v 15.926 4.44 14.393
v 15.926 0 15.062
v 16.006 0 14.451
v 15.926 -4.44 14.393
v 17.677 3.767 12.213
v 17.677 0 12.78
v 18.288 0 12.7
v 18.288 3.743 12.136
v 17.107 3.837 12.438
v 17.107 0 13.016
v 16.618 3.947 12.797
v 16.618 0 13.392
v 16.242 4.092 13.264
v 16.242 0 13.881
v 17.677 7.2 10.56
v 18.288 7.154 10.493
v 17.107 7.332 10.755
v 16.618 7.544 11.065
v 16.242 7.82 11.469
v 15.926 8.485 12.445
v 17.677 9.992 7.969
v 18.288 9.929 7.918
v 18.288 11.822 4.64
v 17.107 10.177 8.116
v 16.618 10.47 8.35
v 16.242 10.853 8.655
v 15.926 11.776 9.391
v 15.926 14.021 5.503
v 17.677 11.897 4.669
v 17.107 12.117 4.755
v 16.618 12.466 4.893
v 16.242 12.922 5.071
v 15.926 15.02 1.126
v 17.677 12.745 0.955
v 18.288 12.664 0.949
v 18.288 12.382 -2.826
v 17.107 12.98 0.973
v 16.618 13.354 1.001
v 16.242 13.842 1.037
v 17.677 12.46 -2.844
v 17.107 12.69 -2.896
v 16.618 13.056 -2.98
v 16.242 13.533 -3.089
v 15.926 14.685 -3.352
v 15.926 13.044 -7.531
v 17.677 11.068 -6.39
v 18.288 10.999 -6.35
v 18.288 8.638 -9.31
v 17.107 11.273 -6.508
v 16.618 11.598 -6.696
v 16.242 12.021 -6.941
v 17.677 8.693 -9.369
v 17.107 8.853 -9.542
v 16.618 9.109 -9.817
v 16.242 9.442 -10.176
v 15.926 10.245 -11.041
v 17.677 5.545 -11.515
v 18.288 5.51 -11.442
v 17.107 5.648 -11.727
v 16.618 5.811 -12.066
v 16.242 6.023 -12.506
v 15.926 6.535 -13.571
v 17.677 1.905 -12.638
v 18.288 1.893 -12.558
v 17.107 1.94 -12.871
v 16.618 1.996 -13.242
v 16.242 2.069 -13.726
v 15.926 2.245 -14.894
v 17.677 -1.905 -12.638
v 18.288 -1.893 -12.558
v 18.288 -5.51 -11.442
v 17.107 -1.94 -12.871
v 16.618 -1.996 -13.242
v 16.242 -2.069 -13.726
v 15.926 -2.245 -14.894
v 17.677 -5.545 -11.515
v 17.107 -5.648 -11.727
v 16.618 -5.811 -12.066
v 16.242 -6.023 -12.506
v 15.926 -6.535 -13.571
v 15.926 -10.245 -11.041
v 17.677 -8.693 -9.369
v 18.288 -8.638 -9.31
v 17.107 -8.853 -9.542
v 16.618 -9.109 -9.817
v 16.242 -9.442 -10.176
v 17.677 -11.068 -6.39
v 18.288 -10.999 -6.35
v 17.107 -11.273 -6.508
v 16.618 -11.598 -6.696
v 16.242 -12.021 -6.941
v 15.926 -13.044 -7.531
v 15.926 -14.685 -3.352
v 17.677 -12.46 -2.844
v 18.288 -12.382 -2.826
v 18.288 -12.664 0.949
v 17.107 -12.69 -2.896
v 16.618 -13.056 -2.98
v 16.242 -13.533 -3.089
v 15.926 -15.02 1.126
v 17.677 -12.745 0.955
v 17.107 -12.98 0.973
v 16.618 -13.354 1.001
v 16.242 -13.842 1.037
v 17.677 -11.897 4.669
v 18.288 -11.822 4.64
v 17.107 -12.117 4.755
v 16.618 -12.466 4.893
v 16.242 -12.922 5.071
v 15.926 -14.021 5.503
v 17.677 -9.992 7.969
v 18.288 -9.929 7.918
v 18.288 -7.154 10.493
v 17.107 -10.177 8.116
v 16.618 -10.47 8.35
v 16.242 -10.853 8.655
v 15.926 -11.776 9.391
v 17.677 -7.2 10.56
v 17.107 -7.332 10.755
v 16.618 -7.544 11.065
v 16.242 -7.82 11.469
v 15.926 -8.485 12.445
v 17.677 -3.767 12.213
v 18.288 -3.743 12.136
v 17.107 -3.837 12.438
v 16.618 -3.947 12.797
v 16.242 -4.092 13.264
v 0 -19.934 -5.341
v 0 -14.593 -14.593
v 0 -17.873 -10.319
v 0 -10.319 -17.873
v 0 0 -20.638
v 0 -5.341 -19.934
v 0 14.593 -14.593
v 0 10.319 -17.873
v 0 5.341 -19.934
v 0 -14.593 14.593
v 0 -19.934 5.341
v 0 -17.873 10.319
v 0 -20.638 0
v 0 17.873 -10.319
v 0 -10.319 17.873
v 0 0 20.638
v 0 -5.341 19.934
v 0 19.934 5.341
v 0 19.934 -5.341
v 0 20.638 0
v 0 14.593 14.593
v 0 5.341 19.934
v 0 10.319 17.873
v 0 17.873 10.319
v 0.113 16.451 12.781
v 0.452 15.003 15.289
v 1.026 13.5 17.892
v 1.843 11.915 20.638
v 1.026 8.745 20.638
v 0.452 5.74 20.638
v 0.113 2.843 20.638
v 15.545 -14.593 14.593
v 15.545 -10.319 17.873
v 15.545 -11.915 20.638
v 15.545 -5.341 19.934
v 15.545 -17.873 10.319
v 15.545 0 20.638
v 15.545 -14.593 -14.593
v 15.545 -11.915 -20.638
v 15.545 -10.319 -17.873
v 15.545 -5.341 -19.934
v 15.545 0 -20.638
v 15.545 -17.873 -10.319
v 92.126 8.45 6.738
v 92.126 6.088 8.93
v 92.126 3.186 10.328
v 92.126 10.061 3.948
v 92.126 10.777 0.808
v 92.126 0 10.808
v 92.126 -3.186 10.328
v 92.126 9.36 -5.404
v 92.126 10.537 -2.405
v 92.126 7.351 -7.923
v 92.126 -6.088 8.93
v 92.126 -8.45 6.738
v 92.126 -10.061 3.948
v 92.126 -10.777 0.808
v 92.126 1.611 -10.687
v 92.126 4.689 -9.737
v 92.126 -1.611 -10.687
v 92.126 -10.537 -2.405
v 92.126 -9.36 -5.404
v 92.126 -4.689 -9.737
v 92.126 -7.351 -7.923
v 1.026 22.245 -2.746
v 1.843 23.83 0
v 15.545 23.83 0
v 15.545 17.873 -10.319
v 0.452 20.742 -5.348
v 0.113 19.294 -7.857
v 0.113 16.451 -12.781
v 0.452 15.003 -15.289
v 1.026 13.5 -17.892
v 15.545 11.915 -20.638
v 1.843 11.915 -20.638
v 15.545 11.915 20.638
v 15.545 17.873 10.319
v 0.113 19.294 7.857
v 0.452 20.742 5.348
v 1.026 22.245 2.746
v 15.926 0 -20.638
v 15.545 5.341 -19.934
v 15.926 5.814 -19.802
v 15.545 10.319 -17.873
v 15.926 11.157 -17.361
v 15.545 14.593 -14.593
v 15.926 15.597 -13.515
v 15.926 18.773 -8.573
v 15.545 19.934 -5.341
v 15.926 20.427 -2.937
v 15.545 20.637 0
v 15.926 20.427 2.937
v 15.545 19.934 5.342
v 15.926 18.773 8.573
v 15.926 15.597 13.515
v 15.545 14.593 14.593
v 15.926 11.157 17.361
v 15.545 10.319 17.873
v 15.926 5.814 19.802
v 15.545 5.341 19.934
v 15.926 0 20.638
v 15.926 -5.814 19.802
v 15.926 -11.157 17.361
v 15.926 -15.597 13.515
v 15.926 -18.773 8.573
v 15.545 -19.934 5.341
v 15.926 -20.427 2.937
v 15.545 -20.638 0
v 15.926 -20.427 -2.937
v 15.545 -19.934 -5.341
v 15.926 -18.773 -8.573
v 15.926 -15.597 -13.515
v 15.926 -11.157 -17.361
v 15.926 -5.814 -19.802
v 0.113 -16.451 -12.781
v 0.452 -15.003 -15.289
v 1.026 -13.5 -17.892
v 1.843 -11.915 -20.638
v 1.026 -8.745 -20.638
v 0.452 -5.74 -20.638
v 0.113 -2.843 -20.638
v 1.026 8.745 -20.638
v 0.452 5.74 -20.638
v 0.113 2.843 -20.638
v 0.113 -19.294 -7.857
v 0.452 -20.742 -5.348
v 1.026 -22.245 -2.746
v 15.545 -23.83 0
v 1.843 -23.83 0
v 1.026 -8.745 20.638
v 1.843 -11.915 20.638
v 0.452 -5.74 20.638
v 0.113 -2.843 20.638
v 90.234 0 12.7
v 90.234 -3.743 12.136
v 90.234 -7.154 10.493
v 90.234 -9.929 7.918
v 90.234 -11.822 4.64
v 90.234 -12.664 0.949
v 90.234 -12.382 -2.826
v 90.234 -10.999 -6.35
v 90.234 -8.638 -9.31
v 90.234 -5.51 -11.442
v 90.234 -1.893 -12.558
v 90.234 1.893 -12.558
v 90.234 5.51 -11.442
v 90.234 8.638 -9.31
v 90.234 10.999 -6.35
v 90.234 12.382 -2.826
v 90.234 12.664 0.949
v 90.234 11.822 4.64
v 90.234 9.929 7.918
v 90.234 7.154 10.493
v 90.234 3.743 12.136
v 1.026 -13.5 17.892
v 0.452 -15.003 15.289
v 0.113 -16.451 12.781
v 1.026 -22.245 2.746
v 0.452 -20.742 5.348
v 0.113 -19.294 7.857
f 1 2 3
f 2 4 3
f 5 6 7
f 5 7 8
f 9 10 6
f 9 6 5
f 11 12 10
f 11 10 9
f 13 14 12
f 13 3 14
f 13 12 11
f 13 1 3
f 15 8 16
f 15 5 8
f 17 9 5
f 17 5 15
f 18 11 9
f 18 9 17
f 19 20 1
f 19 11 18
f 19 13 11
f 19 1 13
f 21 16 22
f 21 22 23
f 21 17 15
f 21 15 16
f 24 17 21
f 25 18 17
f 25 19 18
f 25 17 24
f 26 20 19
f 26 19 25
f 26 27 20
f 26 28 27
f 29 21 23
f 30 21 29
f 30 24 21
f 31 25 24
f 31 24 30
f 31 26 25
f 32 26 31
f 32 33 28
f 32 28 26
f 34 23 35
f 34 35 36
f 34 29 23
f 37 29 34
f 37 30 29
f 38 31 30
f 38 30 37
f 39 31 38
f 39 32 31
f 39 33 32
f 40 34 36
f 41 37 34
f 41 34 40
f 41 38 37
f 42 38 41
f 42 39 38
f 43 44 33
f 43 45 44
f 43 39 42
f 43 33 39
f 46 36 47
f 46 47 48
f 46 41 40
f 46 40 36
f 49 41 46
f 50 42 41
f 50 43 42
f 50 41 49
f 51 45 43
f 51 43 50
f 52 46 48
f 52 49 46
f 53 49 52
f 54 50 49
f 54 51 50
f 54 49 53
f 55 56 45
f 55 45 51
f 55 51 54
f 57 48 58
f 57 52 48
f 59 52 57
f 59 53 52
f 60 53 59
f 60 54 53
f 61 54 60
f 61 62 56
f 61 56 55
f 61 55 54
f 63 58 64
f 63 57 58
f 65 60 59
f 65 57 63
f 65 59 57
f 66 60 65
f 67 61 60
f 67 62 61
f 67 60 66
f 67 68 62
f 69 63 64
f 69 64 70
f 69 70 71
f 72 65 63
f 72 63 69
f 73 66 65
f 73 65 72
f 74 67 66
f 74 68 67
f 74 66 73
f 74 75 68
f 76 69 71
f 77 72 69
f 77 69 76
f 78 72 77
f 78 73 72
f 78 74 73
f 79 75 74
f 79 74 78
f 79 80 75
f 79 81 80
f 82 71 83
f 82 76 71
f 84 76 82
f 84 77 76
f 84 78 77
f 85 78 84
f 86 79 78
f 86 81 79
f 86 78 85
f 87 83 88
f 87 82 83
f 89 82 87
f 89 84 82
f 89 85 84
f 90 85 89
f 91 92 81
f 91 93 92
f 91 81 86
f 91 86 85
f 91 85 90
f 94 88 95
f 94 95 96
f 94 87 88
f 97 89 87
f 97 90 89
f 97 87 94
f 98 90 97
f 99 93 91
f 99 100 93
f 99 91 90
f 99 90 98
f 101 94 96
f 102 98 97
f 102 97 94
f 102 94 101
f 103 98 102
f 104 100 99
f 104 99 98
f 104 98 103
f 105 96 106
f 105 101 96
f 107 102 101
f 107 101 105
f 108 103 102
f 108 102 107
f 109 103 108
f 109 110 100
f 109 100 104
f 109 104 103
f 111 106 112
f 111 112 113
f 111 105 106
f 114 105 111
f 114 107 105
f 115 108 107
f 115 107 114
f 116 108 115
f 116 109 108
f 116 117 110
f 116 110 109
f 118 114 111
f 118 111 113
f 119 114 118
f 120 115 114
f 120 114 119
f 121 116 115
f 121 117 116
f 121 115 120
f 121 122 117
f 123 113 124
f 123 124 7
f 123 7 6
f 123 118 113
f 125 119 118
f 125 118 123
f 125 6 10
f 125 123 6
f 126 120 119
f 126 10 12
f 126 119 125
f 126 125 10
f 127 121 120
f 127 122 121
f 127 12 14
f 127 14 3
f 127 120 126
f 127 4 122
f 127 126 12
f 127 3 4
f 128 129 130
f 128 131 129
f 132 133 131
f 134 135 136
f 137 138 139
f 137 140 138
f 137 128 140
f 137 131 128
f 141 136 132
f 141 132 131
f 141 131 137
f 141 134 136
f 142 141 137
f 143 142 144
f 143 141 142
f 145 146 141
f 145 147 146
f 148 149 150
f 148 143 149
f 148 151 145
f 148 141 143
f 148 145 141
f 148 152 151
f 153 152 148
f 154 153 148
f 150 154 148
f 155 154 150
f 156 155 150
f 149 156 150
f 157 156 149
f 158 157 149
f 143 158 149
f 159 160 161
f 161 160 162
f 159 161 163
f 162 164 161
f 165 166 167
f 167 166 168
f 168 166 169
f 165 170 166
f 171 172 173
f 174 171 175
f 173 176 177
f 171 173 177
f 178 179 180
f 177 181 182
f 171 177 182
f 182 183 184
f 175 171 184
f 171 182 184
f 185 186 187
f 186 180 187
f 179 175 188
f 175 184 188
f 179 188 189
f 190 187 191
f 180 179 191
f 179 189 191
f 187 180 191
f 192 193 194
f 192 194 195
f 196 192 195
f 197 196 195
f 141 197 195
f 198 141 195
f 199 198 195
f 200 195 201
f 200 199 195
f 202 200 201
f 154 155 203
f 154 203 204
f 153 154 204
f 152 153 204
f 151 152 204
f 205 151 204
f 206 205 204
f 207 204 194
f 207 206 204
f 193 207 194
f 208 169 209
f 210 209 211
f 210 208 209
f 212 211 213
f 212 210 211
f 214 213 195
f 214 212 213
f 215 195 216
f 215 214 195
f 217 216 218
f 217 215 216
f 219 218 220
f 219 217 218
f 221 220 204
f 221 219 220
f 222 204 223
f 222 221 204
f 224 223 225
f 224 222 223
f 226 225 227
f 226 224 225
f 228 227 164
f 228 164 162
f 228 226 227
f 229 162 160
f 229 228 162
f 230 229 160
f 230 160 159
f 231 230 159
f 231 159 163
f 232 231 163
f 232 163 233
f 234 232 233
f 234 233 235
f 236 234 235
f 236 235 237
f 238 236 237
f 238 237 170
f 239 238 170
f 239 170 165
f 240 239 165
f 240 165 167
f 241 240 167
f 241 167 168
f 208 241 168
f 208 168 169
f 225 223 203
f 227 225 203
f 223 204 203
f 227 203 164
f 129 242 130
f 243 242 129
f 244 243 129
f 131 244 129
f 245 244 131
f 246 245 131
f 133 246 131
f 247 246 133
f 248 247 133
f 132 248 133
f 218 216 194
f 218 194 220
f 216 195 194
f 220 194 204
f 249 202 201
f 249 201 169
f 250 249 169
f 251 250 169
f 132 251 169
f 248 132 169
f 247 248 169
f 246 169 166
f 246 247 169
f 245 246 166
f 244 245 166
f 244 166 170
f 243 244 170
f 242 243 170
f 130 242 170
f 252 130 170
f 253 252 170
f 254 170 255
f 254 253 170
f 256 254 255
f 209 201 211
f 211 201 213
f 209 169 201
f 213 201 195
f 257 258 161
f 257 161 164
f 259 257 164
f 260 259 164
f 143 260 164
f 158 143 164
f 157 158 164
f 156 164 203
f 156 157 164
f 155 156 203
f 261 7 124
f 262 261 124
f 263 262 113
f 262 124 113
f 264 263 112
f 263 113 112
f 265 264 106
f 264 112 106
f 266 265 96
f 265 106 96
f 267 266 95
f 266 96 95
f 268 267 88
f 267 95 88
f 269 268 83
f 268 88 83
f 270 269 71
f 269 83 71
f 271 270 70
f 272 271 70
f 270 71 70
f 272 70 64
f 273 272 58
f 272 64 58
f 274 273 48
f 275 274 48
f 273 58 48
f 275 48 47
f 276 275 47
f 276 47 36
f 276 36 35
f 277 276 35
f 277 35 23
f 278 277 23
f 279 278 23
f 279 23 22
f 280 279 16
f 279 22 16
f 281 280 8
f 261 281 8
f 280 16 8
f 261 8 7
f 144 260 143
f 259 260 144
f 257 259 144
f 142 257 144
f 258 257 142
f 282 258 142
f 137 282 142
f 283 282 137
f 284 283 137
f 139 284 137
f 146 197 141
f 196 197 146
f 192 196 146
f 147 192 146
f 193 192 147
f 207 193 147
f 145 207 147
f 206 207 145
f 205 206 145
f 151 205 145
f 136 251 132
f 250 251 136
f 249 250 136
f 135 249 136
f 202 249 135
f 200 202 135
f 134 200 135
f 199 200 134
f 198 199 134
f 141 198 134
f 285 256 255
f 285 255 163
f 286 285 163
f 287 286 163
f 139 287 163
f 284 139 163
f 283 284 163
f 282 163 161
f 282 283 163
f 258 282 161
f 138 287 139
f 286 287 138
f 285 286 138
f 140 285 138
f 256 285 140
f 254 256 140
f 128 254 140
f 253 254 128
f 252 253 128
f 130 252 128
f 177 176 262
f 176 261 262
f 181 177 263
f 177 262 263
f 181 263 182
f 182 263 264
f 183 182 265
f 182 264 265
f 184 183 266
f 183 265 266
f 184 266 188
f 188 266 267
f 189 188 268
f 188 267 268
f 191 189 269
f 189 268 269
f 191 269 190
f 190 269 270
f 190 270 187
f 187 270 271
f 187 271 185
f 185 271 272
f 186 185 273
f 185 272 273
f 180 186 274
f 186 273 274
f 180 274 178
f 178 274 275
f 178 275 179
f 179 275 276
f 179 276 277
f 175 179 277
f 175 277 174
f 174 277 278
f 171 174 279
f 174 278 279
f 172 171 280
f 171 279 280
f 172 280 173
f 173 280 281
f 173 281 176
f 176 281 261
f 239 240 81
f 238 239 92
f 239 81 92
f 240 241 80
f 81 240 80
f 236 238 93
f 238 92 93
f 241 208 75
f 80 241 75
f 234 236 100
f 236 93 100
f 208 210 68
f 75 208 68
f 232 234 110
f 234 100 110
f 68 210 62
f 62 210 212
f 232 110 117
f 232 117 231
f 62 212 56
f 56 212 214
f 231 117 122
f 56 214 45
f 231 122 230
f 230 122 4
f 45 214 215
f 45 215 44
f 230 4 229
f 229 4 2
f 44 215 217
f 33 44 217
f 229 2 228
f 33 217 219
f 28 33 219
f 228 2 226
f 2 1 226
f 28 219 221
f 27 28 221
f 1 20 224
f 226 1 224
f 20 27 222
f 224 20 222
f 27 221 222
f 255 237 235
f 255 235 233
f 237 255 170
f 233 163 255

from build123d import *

# Parameters (mm, degrees)
BASEHEAD_DEPTH = 15.9258
SKETCH4_W      = 0.381
SKETCH4_H      = 28.592632361
HEADFILLET_R   = 2.3622


with BuildPart() as part:
    # Sketch1 → BaseHead (new body)
    with BuildSketch(Plane(origin=(0, 0, 0), x_dir=(0, 0, -1), z_dir=(1, 0, 0))):
        Polygon((20.6375, 11.91506618), (20.6375, -11.91506618), (0, -23.830132361), (-20.6375, -11.91506618), (-20.6375, 11.91506618), (0, 23.830132361), align=None)
    extrude(amount=BASEHEAD_DEPTH)

    # BodySke → BaseBody (revolve)
    with BuildSketch(Plane.XY, mode=Mode.PRIVATE) as basebody_sk:
        Polygon((0, 0), (92.1258, 0), (92.1258, 10.8077), (90.2335, 12.7), (0, 12.7), align=None)
    revolve(basebody_sk.sketch.rotate(Axis((0, 0, 0), (1, 0, 0)), 90), axis=Axis((0, 0, 0), (1, 0, 0)))

    # Sketch3 → HeadChamfer (revolve, cut)
    with BuildSketch(Plane.XY):
        Polygon((0, 20.6375), (5.509441362, 30.180132361), (5.509441362, 36.530132361), (-12.7, 36.530132361), (-12.7, 20.6375), align=None)
    revolve(axis=Axis((0, 0, 0), (1, 0, 0)), mode=Mode.SUBTRACT)

    # Sketch4 → BearingFace (revolve, cut)
    with BuildSketch(Plane.XY, mode=Mode.PRIVATE) as bearingface_sk:
        with Locations((15.7353, 34.933816181)):
            Rectangle(SKETCH4_W, SKETCH4_H)
    revolve(bearingface_sk.sketch.rotate(Axis((0, 0, 0), (1, 0, 0)), 270), axis=Axis((0, 0, 0), (1, 0, 0)), mode=Mode.SUBTRACT)

    # HeadFillet
    headfillet_edges = [part.edges().sort_by_distance(p)[0] for p in [
        (15.9258, 0, -12.7),
    ]]
    fillet(headfillet_edges, radius=HEADFILLET_R)


solid = part.part
